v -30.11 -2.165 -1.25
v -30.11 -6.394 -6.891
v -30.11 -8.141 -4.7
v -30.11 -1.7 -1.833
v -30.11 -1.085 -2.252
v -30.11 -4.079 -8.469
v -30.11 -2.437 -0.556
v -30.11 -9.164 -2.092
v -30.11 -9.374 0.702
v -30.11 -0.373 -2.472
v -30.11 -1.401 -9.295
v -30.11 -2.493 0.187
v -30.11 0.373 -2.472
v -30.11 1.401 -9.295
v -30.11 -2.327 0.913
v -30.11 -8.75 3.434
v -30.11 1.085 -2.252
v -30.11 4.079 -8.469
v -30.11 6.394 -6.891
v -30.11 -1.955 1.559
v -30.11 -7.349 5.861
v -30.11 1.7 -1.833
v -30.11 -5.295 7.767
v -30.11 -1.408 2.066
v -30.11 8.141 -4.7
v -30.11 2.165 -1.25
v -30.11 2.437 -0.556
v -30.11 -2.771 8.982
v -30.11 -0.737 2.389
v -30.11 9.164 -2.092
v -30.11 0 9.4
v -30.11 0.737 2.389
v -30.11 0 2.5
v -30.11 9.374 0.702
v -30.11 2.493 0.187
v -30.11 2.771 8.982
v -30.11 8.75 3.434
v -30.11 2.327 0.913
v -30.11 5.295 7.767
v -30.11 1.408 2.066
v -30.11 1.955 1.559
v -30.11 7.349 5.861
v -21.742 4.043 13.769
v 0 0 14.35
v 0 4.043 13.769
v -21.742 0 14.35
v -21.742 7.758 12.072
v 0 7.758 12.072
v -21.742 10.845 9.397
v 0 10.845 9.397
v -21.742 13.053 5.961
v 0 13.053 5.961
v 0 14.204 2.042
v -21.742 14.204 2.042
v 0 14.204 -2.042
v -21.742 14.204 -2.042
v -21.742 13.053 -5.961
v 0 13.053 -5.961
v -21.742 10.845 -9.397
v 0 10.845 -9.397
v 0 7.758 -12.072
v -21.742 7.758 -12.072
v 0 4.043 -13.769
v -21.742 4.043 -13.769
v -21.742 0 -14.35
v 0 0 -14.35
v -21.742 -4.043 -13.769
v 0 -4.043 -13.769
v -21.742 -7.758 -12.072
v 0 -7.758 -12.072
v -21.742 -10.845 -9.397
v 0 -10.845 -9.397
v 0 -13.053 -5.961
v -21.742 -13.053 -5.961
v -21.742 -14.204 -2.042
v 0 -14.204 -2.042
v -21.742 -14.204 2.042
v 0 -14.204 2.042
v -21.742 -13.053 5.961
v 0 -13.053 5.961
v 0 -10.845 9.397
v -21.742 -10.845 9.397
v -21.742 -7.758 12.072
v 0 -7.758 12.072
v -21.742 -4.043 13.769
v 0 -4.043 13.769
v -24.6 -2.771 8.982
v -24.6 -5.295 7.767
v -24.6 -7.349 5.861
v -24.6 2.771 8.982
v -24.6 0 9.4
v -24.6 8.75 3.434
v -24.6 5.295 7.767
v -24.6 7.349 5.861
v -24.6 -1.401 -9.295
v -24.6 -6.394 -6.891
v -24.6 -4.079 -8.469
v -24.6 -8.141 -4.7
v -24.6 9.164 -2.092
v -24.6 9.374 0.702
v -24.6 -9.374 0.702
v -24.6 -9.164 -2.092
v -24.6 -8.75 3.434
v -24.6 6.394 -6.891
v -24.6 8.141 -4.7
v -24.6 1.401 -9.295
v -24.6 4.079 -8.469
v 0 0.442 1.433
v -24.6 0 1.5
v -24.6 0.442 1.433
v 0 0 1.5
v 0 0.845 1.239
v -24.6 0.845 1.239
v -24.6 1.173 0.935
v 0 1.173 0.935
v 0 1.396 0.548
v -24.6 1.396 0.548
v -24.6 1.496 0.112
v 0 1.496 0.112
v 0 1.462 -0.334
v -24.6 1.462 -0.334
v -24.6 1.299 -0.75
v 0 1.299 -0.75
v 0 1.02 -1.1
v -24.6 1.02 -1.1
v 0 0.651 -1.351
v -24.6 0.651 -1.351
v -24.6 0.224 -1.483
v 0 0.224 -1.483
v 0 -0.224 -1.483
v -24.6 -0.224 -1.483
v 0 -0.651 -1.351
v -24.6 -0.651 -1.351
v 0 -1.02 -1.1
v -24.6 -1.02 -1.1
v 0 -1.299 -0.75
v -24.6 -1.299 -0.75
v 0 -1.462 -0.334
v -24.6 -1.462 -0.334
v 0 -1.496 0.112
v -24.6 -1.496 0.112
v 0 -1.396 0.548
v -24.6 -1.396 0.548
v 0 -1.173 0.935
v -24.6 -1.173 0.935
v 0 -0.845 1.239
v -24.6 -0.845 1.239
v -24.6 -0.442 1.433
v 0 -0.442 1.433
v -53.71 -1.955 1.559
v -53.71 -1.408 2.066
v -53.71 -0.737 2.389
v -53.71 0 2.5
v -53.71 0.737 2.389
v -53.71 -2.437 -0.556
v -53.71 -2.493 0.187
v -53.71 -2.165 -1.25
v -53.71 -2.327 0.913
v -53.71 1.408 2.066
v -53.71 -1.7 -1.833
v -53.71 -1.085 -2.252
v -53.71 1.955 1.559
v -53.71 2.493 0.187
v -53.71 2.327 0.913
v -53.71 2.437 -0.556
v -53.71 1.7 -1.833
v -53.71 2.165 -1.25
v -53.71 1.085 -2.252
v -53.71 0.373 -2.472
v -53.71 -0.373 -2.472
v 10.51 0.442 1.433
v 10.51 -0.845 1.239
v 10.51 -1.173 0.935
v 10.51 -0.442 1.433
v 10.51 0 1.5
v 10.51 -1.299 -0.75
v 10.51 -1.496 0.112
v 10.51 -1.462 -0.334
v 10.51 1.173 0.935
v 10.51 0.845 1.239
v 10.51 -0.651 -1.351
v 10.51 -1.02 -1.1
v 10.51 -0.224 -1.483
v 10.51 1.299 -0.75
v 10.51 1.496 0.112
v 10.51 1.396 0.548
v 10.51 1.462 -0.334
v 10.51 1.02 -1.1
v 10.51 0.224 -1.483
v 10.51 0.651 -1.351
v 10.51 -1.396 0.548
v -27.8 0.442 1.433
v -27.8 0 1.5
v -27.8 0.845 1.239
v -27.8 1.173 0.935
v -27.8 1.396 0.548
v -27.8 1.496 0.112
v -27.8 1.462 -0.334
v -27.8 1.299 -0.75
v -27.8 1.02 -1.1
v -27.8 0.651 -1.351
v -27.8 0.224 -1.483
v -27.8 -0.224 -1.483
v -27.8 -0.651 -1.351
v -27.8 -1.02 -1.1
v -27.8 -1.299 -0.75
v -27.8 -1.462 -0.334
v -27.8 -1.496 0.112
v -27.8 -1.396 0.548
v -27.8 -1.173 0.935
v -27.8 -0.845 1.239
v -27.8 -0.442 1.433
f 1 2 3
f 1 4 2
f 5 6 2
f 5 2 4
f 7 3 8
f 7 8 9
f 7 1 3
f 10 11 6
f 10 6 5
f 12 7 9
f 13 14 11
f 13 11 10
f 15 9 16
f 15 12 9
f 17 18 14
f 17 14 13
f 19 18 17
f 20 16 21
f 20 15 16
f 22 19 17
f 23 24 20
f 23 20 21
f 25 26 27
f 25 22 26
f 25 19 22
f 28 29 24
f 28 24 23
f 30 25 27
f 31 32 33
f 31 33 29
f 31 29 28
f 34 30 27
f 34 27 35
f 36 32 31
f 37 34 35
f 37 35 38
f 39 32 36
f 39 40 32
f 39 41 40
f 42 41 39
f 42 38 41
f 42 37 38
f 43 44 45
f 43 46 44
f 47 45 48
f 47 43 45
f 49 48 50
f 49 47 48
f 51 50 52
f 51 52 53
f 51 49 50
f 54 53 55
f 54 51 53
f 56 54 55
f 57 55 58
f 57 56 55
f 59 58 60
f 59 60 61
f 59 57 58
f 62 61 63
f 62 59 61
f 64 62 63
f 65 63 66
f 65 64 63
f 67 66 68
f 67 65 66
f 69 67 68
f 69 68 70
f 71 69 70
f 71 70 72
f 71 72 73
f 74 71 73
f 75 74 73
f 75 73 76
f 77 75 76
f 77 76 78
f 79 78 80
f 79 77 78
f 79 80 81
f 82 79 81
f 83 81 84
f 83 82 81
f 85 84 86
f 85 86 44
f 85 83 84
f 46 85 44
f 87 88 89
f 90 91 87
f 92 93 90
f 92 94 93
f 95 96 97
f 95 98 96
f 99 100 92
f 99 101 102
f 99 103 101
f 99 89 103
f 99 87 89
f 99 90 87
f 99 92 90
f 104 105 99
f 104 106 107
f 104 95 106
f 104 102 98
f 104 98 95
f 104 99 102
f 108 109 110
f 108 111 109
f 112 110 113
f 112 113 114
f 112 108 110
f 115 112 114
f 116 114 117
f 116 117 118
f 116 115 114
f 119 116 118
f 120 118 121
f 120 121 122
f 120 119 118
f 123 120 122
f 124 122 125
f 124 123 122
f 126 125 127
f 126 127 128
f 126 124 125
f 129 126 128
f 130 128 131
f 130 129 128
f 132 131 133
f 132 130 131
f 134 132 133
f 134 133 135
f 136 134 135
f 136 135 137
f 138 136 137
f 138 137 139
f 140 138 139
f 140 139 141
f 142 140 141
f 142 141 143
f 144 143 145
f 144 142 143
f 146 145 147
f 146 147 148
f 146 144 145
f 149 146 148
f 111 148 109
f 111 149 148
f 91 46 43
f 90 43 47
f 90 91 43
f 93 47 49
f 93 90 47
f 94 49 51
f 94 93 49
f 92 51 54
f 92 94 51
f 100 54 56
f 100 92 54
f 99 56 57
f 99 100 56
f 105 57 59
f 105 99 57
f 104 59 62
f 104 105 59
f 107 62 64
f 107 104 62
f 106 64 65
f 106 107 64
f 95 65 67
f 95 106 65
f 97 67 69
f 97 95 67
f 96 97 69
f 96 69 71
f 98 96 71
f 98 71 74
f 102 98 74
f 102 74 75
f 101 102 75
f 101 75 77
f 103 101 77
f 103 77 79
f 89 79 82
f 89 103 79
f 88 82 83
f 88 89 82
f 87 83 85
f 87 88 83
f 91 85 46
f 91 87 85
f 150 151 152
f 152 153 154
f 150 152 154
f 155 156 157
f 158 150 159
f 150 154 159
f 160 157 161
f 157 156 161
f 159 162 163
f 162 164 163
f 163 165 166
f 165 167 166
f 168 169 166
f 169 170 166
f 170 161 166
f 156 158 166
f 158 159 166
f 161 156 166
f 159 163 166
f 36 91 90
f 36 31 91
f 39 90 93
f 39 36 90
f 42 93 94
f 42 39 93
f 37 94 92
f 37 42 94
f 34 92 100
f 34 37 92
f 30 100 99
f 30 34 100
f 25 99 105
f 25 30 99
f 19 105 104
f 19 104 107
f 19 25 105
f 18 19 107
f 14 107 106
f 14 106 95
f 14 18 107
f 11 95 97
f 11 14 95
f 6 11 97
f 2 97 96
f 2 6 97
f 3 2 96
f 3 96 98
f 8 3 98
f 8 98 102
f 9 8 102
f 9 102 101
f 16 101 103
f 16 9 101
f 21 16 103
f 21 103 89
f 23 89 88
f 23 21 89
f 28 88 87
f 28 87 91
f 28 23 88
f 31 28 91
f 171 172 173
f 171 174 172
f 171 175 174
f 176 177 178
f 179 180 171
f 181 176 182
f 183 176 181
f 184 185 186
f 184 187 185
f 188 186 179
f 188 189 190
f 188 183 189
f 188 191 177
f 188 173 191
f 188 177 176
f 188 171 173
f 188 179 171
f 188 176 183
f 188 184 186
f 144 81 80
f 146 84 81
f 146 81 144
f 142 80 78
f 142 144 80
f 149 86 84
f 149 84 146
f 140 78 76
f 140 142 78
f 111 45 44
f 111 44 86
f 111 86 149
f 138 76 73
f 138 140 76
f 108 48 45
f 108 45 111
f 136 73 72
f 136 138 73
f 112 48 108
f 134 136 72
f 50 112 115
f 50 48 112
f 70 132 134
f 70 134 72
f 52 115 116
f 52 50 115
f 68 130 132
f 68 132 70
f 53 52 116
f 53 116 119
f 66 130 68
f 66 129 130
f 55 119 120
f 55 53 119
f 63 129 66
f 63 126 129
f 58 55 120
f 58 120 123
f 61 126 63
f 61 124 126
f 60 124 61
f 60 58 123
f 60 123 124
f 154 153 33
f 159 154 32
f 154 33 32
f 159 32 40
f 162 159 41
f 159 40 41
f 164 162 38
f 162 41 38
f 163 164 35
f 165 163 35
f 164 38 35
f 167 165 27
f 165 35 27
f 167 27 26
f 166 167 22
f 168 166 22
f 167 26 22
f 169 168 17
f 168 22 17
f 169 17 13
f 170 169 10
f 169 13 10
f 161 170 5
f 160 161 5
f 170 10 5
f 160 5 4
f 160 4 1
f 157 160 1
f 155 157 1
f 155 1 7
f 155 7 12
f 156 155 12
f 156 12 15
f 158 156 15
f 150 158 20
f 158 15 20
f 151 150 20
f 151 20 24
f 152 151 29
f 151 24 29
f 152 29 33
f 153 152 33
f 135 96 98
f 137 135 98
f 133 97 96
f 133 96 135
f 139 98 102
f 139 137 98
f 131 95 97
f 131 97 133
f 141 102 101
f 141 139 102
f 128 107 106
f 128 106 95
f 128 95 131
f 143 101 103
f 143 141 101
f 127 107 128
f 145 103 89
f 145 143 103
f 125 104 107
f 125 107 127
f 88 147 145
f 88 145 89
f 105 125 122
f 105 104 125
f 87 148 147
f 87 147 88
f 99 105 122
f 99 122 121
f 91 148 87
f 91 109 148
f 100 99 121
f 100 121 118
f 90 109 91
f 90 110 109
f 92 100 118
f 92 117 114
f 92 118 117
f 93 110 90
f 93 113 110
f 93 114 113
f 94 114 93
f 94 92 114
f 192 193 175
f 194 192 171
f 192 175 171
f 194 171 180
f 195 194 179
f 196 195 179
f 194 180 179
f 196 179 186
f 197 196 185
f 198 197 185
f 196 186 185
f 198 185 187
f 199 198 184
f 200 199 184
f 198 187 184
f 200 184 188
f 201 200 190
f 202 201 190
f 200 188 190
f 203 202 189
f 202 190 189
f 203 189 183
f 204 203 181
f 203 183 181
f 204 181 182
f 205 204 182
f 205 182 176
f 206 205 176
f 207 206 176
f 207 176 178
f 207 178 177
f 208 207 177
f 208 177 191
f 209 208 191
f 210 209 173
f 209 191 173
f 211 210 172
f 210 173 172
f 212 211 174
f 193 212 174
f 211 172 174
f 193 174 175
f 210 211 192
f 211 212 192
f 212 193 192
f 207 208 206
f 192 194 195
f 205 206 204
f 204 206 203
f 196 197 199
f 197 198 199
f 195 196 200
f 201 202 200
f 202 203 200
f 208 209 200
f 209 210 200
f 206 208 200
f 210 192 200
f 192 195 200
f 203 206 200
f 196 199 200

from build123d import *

# Parameters (mm, degrees)
F1_W = 10.51
F1_H = 1.5
F2_W = 38.31
F2_H = 1.5
F3_W = 23.6
F3_H = 2.5


with BuildPart() as f4:
    # F1 (on Front) → F4 (revolve)
    with BuildSketch(Plane.XZ):
        with Locations((5.255, 0.75)):
            Rectangle(F1_W, F1_H)
    revolve(axis=Axis((-21.6, 0, 0), (-1, 0, 0)))

    # F2 (on Front) → F5 (revolve)
    with BuildSketch(Plane.XZ):
        with Locations((-8.645, 0.75)):
            Rectangle(F2_W, F2_H)
    revolve(axis=Axis((-21.6, 0, 0), (-1, 0, 0)))


with BuildPart() as f4b:
    # F1 (on Front) → F4, piece 2 (revolve)
    with BuildSketch(Plane.XZ):
        Polygon((0, 14.35), (-21.7421161675, 14.35), (-24.6, 9.4), (-24.6, 1.5), (0, 1.5), align=None)
    revolve(axis=Axis((-21.6, 0, 0), (-1, 0, 0)))


with BuildPart() as f6:
    # F3 (on Front) → F6 (revolve)
    with BuildSketch(Plane.XZ):
        with Locations((-41.91, 1.25)):
            Rectangle(F3_W, F3_H)
        Polygon((-24.6, 9.4), (-30.11, 9.4), (-30.11, 2.5), (-30.11, 0), (-24.6, 0), align=None)
    revolve(axis=Axis((-21.6, 0, 0), (-1, 0, 0)))


solid = Compound([f4.part, f4b.part, f6.part])
